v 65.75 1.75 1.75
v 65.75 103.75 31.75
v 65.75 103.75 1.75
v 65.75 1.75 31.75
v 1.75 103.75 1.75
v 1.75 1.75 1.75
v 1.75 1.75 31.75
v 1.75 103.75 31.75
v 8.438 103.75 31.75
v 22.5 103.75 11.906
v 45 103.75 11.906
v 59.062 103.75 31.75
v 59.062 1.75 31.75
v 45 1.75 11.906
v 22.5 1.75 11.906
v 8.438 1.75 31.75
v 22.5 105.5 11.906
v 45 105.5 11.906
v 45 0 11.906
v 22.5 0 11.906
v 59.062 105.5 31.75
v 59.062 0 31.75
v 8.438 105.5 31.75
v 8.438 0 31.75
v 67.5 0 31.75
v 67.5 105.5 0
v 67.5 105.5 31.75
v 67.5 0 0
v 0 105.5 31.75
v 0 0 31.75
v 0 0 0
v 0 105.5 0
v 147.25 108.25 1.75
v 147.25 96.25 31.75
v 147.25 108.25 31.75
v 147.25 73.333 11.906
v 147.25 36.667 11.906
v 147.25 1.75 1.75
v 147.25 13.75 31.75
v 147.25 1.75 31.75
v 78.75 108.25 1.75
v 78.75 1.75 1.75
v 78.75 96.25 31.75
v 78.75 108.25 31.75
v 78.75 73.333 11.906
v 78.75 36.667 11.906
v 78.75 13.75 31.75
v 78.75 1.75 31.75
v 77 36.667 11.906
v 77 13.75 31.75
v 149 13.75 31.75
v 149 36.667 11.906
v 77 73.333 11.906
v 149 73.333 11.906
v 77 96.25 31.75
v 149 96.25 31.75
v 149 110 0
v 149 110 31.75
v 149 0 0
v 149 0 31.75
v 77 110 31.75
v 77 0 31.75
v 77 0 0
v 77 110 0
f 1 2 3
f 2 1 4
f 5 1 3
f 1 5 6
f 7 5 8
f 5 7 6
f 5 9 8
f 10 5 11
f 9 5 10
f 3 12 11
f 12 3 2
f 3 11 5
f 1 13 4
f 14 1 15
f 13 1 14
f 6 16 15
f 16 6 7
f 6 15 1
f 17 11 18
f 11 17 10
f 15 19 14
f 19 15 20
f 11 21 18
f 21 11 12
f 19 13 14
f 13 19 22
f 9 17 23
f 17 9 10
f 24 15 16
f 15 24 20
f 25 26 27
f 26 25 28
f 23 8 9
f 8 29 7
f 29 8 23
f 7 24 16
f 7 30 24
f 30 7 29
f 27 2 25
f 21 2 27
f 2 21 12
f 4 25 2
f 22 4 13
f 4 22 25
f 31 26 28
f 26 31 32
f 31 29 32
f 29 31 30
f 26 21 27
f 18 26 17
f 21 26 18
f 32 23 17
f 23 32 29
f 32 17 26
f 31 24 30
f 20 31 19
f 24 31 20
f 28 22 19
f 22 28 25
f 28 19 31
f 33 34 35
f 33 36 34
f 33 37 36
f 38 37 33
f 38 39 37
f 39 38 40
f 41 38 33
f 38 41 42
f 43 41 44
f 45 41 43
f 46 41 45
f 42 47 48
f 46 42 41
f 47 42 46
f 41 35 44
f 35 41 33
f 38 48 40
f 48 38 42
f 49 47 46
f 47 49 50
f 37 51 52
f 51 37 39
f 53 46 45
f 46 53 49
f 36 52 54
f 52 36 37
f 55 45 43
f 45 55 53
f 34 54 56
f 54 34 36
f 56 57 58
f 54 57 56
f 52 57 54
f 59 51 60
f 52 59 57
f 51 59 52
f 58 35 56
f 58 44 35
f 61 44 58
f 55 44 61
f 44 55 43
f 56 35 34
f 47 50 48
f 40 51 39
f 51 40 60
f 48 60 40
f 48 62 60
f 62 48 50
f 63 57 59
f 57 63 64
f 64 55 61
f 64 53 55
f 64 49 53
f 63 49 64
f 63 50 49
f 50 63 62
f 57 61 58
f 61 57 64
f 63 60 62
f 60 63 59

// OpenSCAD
// Maximim card width (default 64)
card_size_x = 64;

// Maximum card lenght (default 102)
card_size_y = 102;

// Maximum internal height (default 30)
height = 30;

// Thickness of the walls (default 1.75)
wall_thickness = 1.75;

// Separation between upper and lower (default 0.5)
tolerance = 0.5;

/* {{{ %%SECTION_HEADER%%
 * * * *
 * This header information is automatically generated by KodeUtils.
 *
 * File 'tarjetero.scad' edited by kwendenarmo, last modified: 2017-04-15.
 * This file is part of 'tarjetero' package, please see the readme files for more information about this file and this package.
 *
 * Copyright (C) 2017 by kwendenarmo <kwendenarmo@akornsys-rdi.net>
 * Released under the GNU GPLv3
 *
 *    This program is free software: you can redistribute it and/or modify
 *    it under the terms of the GNU General Public License as published by
 *    the Free Software Foundation, either version 3 of the License, or
 *    (at your option) any later version.
 *
 *    This program is distributed in the hope that it will be useful,
 *    but WITHOUT ANY WARRANTY; without even the implied warranty of
 *    MERCHANTABILITY or FITNESS FOR A PARTICULAR PURPOSE.  See the
 *    GNU General Public License for more details.
 *
 *    You should have received a copy of the GNU General Public License
 *    along with this program.  If not, see <http://www.gnu.org/licenses/>.
 *
 * * * *
 * %%EOS_HEADER%% }}}
 */

$fn=60;

//Standard case size 64x102x30

lower();
translate([card_size_x+(wall_thickness*2+tolerance)*2+5,0,0]) upper();

module upper() {
    box_x=card_size_x+(wall_thickness*2+tolerance)*2;
    box_y=card_size_y+(wall_thickness*2+tolerance)*2;
    box_z=height+wall_thickness;
    inner_box_x=card_size_x+(wall_thickness+tolerance)*2;
    inner_box_y=card_size_y+(wall_thickness+tolerance)*2;

    difference() {
        union() {
            cube([box_x,box_y,box_z]);
        }
        union() {
            translate([wall_thickness,wall_thickness,wall_thickness]) cube([inner_box_x,inner_box_y,height+1]);
            translate([-1,box_y/3,(box_z/8)*3]) hull() {
                cube([box_x+2,box_y/3,1]);
                translate([0,-box_y/3+box_y/8,(box_z/8)*5]) cube([box_x+2,(box_y/8)*6,1]);
            }
        }
    }
}

module lower() {
    box_x=card_size_x+(wall_thickness)*2;
    box_y=card_size_y+(wall_thickness)*2;
    box_z=height+wall_thickness;

    difference() {
        union() {
            cube([box_x,box_y,box_z]);
        }
        union() {
            translate([wall_thickness,wall_thickness,wall_thickness]) cube([card_size_x,card_size_y,height+1]);
            translate([box_x/3,-1,(box_z/8)*3]) hull() {
                cube([box_x/3,box_y+2,1]);
                translate([-box_x/3+box_x/8,0,(box_z/8)*5]) cube([(box_x/8)*6,box_y+2,1]);
            }
        }
    }
}
